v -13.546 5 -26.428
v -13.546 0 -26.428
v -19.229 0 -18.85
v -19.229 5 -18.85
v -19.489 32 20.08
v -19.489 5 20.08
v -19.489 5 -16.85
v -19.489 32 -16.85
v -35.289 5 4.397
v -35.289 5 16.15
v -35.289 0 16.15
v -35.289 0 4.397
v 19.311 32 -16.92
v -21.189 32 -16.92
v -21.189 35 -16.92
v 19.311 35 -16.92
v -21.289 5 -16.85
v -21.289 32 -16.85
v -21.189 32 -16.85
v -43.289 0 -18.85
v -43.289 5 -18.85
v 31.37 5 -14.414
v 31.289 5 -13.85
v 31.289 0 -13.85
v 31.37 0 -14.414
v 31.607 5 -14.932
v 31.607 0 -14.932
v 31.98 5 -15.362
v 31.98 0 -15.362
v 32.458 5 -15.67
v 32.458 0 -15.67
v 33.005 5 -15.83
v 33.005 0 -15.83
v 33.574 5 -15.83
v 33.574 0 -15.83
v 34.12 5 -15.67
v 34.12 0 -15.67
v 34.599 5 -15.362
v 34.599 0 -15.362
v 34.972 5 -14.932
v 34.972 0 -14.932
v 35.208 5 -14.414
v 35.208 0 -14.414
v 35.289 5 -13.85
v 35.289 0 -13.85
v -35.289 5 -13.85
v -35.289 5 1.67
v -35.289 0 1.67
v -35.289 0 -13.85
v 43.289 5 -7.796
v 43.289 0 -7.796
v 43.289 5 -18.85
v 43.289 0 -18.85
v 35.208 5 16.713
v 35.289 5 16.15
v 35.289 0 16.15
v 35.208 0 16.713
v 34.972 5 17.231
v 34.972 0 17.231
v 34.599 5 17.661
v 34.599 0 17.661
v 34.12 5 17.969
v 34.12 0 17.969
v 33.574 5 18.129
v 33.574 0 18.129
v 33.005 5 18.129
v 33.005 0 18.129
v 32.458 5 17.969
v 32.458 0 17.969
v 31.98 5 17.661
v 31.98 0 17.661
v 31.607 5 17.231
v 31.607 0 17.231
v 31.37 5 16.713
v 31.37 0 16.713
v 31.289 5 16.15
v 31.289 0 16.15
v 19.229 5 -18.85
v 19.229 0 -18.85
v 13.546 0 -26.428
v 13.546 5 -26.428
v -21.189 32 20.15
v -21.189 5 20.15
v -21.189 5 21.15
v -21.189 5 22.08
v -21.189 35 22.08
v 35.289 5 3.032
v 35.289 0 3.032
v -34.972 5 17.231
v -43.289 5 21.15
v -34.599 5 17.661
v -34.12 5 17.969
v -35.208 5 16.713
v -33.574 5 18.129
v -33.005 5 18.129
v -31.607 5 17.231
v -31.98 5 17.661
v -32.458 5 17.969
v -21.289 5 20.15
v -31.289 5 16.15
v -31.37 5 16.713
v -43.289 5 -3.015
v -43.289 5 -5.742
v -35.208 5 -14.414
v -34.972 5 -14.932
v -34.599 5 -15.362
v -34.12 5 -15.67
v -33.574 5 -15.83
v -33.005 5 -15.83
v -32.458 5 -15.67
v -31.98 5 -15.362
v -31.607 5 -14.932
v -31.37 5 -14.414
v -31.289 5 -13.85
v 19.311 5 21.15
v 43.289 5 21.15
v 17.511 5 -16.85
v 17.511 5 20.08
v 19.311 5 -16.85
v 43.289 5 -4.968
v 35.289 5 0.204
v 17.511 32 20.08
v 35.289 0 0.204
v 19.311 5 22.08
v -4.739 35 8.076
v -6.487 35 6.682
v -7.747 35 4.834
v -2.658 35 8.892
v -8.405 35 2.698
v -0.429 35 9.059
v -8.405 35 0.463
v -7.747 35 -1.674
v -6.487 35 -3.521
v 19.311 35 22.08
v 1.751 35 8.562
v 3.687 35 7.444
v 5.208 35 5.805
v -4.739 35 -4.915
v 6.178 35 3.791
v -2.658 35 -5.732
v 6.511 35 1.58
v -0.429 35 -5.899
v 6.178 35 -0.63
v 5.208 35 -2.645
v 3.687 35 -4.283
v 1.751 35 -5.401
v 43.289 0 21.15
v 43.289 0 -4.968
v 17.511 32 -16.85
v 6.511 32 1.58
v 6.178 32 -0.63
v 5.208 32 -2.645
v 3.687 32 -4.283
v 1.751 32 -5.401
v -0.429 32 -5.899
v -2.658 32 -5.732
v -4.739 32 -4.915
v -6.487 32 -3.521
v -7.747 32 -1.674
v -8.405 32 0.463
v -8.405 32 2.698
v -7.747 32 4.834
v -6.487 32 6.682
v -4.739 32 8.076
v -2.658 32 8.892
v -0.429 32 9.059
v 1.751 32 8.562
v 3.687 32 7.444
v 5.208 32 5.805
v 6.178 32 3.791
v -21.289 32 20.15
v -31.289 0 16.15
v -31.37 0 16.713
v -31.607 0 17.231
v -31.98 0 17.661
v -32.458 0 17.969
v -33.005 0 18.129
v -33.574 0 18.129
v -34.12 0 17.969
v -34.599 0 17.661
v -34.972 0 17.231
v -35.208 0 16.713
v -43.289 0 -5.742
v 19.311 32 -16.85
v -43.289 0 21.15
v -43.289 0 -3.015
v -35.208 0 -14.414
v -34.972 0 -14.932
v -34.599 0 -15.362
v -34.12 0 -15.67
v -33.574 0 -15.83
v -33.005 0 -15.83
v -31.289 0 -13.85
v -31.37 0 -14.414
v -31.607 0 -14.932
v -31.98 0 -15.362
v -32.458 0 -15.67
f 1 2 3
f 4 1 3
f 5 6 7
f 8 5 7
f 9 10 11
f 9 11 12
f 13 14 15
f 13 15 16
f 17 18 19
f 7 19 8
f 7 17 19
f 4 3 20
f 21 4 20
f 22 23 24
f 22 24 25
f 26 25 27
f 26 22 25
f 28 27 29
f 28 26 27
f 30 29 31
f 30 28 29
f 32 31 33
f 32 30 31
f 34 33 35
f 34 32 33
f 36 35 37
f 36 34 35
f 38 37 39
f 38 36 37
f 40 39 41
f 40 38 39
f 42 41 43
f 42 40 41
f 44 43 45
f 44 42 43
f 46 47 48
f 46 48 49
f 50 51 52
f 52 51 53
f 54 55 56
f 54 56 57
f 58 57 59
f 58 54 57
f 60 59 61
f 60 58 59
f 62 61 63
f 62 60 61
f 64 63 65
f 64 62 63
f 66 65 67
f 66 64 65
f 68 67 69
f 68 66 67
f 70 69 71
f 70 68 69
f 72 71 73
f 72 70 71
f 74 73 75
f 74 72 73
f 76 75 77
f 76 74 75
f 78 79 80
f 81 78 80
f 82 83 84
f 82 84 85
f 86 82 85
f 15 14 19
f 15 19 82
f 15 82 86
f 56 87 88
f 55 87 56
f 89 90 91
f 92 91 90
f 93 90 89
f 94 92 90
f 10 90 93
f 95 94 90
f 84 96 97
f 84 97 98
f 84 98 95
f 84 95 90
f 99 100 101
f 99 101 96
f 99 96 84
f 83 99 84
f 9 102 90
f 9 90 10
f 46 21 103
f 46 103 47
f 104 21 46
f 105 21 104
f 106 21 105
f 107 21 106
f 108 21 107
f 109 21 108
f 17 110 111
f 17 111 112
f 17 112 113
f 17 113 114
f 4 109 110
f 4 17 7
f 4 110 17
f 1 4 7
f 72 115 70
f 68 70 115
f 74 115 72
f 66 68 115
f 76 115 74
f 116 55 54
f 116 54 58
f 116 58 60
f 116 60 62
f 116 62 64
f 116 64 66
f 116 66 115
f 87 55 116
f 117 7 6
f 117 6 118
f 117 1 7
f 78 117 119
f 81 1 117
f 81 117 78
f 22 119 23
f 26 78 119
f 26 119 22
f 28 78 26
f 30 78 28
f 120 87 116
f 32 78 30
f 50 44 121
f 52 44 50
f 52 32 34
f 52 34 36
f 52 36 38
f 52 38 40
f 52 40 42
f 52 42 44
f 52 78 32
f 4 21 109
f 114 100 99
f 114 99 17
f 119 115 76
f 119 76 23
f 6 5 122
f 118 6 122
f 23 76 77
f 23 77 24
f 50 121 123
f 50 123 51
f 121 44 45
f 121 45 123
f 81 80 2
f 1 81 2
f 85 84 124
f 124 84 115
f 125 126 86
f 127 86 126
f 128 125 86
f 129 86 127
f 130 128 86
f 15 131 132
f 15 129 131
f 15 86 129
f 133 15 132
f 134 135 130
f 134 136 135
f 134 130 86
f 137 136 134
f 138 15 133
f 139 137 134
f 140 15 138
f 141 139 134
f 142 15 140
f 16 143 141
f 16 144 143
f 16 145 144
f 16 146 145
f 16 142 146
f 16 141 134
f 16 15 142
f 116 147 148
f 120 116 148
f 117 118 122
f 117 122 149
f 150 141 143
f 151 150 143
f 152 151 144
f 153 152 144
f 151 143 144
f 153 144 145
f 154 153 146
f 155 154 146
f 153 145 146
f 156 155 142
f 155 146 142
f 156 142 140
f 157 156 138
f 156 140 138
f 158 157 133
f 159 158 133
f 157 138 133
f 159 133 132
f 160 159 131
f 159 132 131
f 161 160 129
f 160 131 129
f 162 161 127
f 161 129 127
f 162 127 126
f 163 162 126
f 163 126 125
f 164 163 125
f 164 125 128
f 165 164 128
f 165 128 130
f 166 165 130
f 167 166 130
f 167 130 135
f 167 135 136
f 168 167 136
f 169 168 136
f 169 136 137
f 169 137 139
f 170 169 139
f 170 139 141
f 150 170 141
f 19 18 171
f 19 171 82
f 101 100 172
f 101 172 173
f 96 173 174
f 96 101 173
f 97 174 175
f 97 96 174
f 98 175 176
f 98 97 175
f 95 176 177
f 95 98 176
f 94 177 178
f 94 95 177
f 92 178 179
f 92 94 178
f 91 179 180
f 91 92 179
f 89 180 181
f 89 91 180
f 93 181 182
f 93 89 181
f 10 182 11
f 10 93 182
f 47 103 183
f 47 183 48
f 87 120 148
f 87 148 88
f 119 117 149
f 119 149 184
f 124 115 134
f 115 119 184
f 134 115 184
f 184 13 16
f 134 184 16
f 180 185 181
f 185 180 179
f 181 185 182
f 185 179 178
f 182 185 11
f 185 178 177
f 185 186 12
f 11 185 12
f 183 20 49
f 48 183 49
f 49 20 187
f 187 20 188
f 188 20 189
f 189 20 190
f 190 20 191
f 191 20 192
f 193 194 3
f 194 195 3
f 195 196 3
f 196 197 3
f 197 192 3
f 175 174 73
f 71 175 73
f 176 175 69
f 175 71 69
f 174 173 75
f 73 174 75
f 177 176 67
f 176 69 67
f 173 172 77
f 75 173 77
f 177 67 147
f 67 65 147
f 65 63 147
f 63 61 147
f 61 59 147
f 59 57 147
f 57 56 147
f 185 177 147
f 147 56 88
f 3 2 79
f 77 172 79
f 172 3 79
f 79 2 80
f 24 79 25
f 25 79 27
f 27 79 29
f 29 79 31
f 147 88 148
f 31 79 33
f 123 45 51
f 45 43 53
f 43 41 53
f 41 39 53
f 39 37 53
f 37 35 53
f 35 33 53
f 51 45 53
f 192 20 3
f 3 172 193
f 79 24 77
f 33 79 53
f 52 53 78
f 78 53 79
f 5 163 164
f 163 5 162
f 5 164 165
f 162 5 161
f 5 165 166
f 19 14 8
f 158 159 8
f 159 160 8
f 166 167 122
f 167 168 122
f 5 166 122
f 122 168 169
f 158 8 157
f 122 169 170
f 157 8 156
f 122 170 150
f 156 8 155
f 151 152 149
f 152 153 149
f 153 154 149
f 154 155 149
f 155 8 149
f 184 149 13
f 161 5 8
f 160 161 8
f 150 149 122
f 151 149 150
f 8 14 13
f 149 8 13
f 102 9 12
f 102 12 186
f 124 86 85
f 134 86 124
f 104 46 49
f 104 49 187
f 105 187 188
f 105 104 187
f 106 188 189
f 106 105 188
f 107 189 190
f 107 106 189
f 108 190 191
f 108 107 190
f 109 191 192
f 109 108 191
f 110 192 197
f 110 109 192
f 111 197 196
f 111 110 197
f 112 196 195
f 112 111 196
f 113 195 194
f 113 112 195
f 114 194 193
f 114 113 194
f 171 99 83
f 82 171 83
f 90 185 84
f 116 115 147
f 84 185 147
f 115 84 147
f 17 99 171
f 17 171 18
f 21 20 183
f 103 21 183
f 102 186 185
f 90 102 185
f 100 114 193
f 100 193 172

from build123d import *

# Parameters (mm, degrees)
EXTRUDE_1_DEPTH     = 5
SKETCH_4_W          = 1.8
SKETCH_4_H          = 37
EXTRUDE_2_DEPTH     = 27
SKETCH_5_W          = 40.5
SKETCH_5_H          = 37
EXTRUDE_3_DEPTH     = 3
CUT_EXTRUDE_4_DEPTH = 10
CUT_EXTRUDE_7_DEPTH = 10
CUT_EXTRUDE_8_DEPTH = 10
SKETCH_13_R         = 7.5
CUT_EXTRUDE_9_DEPTH = 10
SKETCH_14_W         = 40.5
SKETCH_14_H         = 30
EXTRUDE_4_DEPTH     = 2


with BuildPart() as part:
    # 草图1 → 凸台-拉伸1 (new body)
    with BuildSketch(Plane(origin=(0, 0, 0), x_dir=(1, 0, 0), z_dir=(0, 1, 0))):
        Polygon((13.545654436, 26.428234879), (-13.545654436, 26.428234879), (-19.229145808, 18.850246383), (-43.289259281, 18.850246383), (-43.289259281, -21.149753617), (43.289259281, -21.149753617), (43.289259281, 18.850246383), (19.229145808, 18.850246383), align=None)
    extrude(amount=EXTRUDE_1_DEPTH)

    # 草图4 → 凸台-拉伸2 (add)
    with BuildSketch(Plane(origin=(0, 5, 0), x_dir=(1, 0, 0), z_dir=(0, 1, 0))):
        with Locations((-20.389259281, -1.649753617)):
            Rectangle(SKETCH_4_W, SKETCH_4_H)
        with Locations((18.410740719, -1.649753617)):
            Rectangle(SKETCH_4_W, SKETCH_4_H)
    extrude(amount=EXTRUDE_2_DEPTH)

    # 草图5 → 凸台-拉伸3 (add)
    with BuildSketch(Plane(origin=(0, 32, 0), x_dir=(1, 0, 0), z_dir=(0, 1, 0))):
        with Locations((-0.939259281, -1.580342136)):
            Rectangle(SKETCH_5_W, SKETCH_5_H)
    extrude(amount=EXTRUDE_3_DEPTH)

    # 草图8 → 切除-拉伸4 (cut)
    with BuildSketch(Plane(origin=(0, 5, 0), x_dir=(1, 0, 0), z_dir=(0, 1, 0))):
        with BuildLine():
            Line((-31.289259281, 13.850246383), (-31.289259281, -16.149753617))
            ThreePointArc((-31.289259281, -16.149753617), (-33.289259281, -18.149753617), (-35.289259281, -16.149753617))
            Line((-35.289259281, -16.149753617), (-35.289259281, 13.850246383))
            ThreePointArc((-35.289259281, 13.850246383), (-33.289259281, 15.850246383), (-31.289259281, 13.850246383))
        make_face()
    extrude(amount=-CUT_EXTRUDE_4_DEPTH, mode=Mode.SUBTRACT)

    # 草图10 → 切除-拉伸7 (cut)
    with BuildSketch(Plane(origin=(0, 5, 0), x_dir=(1, 0, 0), z_dir=(0, 1, 0))):
        with BuildLine():
            Line((35.289259281, 13.850246383), (35.289259281, -16.149753617))
            ThreePointArc((35.289259281, -16.149753617), (33.289259281, -18.149753617), (31.289259281, -16.149753617))
            Line((31.289259281, -16.149753617), (31.289259281, 13.850246383))
            ThreePointArc((31.289259281, 13.850246383), (33.289259281, 15.850246383), (35.289259281, 13.850246383))
        make_face()
    extrude(amount=-CUT_EXTRUDE_7_DEPTH, mode=Mode.SUBTRACT)

    # 草图12 → 切除-拉伸8 (cut)
    with BuildSketch(Plane(origin=(0, 5, 0), x_dir=(1, 0, 0), z_dir=(0, 1, 0))):
        with BuildLine():
            Line((44.805959338, 6.484665103), (34.19935762, -4.121936615))
            ThreePointArc((34.19935762, -4.121936615), (32.785144058, -4.121936615), (32.785144058, -2.707723053))
            Line((32.785144058, -2.707723053), (43.391745776, 7.898878665))
            ThreePointArc((43.391745776, 7.898878665), (44.805959338, 7.898878665), (44.805959338, 6.484665103))
        make_face()
        with BuildLine():
            Line((-44.526375344, 6.888037873), (-33.523218079, -3.306594549))
            ThreePointArc((-33.523218079, -3.306594549), (-33.469316423, -4.719780528), (-34.882502402, -4.773682184))
            Line((-34.882502402, -4.773682184), (-45.885659667, 5.420950238))
            ThreePointArc((-45.885659667, 5.420950238), (-45.939561323, 6.834136217), (-44.526375344, 6.888037873))
        make_face()
    extrude(amount=-CUT_EXTRUDE_8_DEPTH, mode=Mode.SUBTRACT)

    # 草图13 → 切除-拉伸9 (cut)
    with BuildSketch(Plane(origin=(0, 35, 0), x_dir=(1, 0, 0), z_dir=(0, 1, 0))):
        with Locations((-0.989259281, -1.580342136)):
            Circle(SKETCH_13_R)
    extrude(amount=-CUT_EXTRUDE_9_DEPTH, mode=Mode.SUBTRACT)

    # 草图14 → 凸台-拉伸4 (add)
    with BuildSketch(Plane.XY.offset(20.080342136)):
        with Locations((-0.939259281, 20)):
            Rectangle(SKETCH_14_W, SKETCH_14_H)
    extrude(amount=EXTRUDE_4_DEPTH)


solid = part.part
